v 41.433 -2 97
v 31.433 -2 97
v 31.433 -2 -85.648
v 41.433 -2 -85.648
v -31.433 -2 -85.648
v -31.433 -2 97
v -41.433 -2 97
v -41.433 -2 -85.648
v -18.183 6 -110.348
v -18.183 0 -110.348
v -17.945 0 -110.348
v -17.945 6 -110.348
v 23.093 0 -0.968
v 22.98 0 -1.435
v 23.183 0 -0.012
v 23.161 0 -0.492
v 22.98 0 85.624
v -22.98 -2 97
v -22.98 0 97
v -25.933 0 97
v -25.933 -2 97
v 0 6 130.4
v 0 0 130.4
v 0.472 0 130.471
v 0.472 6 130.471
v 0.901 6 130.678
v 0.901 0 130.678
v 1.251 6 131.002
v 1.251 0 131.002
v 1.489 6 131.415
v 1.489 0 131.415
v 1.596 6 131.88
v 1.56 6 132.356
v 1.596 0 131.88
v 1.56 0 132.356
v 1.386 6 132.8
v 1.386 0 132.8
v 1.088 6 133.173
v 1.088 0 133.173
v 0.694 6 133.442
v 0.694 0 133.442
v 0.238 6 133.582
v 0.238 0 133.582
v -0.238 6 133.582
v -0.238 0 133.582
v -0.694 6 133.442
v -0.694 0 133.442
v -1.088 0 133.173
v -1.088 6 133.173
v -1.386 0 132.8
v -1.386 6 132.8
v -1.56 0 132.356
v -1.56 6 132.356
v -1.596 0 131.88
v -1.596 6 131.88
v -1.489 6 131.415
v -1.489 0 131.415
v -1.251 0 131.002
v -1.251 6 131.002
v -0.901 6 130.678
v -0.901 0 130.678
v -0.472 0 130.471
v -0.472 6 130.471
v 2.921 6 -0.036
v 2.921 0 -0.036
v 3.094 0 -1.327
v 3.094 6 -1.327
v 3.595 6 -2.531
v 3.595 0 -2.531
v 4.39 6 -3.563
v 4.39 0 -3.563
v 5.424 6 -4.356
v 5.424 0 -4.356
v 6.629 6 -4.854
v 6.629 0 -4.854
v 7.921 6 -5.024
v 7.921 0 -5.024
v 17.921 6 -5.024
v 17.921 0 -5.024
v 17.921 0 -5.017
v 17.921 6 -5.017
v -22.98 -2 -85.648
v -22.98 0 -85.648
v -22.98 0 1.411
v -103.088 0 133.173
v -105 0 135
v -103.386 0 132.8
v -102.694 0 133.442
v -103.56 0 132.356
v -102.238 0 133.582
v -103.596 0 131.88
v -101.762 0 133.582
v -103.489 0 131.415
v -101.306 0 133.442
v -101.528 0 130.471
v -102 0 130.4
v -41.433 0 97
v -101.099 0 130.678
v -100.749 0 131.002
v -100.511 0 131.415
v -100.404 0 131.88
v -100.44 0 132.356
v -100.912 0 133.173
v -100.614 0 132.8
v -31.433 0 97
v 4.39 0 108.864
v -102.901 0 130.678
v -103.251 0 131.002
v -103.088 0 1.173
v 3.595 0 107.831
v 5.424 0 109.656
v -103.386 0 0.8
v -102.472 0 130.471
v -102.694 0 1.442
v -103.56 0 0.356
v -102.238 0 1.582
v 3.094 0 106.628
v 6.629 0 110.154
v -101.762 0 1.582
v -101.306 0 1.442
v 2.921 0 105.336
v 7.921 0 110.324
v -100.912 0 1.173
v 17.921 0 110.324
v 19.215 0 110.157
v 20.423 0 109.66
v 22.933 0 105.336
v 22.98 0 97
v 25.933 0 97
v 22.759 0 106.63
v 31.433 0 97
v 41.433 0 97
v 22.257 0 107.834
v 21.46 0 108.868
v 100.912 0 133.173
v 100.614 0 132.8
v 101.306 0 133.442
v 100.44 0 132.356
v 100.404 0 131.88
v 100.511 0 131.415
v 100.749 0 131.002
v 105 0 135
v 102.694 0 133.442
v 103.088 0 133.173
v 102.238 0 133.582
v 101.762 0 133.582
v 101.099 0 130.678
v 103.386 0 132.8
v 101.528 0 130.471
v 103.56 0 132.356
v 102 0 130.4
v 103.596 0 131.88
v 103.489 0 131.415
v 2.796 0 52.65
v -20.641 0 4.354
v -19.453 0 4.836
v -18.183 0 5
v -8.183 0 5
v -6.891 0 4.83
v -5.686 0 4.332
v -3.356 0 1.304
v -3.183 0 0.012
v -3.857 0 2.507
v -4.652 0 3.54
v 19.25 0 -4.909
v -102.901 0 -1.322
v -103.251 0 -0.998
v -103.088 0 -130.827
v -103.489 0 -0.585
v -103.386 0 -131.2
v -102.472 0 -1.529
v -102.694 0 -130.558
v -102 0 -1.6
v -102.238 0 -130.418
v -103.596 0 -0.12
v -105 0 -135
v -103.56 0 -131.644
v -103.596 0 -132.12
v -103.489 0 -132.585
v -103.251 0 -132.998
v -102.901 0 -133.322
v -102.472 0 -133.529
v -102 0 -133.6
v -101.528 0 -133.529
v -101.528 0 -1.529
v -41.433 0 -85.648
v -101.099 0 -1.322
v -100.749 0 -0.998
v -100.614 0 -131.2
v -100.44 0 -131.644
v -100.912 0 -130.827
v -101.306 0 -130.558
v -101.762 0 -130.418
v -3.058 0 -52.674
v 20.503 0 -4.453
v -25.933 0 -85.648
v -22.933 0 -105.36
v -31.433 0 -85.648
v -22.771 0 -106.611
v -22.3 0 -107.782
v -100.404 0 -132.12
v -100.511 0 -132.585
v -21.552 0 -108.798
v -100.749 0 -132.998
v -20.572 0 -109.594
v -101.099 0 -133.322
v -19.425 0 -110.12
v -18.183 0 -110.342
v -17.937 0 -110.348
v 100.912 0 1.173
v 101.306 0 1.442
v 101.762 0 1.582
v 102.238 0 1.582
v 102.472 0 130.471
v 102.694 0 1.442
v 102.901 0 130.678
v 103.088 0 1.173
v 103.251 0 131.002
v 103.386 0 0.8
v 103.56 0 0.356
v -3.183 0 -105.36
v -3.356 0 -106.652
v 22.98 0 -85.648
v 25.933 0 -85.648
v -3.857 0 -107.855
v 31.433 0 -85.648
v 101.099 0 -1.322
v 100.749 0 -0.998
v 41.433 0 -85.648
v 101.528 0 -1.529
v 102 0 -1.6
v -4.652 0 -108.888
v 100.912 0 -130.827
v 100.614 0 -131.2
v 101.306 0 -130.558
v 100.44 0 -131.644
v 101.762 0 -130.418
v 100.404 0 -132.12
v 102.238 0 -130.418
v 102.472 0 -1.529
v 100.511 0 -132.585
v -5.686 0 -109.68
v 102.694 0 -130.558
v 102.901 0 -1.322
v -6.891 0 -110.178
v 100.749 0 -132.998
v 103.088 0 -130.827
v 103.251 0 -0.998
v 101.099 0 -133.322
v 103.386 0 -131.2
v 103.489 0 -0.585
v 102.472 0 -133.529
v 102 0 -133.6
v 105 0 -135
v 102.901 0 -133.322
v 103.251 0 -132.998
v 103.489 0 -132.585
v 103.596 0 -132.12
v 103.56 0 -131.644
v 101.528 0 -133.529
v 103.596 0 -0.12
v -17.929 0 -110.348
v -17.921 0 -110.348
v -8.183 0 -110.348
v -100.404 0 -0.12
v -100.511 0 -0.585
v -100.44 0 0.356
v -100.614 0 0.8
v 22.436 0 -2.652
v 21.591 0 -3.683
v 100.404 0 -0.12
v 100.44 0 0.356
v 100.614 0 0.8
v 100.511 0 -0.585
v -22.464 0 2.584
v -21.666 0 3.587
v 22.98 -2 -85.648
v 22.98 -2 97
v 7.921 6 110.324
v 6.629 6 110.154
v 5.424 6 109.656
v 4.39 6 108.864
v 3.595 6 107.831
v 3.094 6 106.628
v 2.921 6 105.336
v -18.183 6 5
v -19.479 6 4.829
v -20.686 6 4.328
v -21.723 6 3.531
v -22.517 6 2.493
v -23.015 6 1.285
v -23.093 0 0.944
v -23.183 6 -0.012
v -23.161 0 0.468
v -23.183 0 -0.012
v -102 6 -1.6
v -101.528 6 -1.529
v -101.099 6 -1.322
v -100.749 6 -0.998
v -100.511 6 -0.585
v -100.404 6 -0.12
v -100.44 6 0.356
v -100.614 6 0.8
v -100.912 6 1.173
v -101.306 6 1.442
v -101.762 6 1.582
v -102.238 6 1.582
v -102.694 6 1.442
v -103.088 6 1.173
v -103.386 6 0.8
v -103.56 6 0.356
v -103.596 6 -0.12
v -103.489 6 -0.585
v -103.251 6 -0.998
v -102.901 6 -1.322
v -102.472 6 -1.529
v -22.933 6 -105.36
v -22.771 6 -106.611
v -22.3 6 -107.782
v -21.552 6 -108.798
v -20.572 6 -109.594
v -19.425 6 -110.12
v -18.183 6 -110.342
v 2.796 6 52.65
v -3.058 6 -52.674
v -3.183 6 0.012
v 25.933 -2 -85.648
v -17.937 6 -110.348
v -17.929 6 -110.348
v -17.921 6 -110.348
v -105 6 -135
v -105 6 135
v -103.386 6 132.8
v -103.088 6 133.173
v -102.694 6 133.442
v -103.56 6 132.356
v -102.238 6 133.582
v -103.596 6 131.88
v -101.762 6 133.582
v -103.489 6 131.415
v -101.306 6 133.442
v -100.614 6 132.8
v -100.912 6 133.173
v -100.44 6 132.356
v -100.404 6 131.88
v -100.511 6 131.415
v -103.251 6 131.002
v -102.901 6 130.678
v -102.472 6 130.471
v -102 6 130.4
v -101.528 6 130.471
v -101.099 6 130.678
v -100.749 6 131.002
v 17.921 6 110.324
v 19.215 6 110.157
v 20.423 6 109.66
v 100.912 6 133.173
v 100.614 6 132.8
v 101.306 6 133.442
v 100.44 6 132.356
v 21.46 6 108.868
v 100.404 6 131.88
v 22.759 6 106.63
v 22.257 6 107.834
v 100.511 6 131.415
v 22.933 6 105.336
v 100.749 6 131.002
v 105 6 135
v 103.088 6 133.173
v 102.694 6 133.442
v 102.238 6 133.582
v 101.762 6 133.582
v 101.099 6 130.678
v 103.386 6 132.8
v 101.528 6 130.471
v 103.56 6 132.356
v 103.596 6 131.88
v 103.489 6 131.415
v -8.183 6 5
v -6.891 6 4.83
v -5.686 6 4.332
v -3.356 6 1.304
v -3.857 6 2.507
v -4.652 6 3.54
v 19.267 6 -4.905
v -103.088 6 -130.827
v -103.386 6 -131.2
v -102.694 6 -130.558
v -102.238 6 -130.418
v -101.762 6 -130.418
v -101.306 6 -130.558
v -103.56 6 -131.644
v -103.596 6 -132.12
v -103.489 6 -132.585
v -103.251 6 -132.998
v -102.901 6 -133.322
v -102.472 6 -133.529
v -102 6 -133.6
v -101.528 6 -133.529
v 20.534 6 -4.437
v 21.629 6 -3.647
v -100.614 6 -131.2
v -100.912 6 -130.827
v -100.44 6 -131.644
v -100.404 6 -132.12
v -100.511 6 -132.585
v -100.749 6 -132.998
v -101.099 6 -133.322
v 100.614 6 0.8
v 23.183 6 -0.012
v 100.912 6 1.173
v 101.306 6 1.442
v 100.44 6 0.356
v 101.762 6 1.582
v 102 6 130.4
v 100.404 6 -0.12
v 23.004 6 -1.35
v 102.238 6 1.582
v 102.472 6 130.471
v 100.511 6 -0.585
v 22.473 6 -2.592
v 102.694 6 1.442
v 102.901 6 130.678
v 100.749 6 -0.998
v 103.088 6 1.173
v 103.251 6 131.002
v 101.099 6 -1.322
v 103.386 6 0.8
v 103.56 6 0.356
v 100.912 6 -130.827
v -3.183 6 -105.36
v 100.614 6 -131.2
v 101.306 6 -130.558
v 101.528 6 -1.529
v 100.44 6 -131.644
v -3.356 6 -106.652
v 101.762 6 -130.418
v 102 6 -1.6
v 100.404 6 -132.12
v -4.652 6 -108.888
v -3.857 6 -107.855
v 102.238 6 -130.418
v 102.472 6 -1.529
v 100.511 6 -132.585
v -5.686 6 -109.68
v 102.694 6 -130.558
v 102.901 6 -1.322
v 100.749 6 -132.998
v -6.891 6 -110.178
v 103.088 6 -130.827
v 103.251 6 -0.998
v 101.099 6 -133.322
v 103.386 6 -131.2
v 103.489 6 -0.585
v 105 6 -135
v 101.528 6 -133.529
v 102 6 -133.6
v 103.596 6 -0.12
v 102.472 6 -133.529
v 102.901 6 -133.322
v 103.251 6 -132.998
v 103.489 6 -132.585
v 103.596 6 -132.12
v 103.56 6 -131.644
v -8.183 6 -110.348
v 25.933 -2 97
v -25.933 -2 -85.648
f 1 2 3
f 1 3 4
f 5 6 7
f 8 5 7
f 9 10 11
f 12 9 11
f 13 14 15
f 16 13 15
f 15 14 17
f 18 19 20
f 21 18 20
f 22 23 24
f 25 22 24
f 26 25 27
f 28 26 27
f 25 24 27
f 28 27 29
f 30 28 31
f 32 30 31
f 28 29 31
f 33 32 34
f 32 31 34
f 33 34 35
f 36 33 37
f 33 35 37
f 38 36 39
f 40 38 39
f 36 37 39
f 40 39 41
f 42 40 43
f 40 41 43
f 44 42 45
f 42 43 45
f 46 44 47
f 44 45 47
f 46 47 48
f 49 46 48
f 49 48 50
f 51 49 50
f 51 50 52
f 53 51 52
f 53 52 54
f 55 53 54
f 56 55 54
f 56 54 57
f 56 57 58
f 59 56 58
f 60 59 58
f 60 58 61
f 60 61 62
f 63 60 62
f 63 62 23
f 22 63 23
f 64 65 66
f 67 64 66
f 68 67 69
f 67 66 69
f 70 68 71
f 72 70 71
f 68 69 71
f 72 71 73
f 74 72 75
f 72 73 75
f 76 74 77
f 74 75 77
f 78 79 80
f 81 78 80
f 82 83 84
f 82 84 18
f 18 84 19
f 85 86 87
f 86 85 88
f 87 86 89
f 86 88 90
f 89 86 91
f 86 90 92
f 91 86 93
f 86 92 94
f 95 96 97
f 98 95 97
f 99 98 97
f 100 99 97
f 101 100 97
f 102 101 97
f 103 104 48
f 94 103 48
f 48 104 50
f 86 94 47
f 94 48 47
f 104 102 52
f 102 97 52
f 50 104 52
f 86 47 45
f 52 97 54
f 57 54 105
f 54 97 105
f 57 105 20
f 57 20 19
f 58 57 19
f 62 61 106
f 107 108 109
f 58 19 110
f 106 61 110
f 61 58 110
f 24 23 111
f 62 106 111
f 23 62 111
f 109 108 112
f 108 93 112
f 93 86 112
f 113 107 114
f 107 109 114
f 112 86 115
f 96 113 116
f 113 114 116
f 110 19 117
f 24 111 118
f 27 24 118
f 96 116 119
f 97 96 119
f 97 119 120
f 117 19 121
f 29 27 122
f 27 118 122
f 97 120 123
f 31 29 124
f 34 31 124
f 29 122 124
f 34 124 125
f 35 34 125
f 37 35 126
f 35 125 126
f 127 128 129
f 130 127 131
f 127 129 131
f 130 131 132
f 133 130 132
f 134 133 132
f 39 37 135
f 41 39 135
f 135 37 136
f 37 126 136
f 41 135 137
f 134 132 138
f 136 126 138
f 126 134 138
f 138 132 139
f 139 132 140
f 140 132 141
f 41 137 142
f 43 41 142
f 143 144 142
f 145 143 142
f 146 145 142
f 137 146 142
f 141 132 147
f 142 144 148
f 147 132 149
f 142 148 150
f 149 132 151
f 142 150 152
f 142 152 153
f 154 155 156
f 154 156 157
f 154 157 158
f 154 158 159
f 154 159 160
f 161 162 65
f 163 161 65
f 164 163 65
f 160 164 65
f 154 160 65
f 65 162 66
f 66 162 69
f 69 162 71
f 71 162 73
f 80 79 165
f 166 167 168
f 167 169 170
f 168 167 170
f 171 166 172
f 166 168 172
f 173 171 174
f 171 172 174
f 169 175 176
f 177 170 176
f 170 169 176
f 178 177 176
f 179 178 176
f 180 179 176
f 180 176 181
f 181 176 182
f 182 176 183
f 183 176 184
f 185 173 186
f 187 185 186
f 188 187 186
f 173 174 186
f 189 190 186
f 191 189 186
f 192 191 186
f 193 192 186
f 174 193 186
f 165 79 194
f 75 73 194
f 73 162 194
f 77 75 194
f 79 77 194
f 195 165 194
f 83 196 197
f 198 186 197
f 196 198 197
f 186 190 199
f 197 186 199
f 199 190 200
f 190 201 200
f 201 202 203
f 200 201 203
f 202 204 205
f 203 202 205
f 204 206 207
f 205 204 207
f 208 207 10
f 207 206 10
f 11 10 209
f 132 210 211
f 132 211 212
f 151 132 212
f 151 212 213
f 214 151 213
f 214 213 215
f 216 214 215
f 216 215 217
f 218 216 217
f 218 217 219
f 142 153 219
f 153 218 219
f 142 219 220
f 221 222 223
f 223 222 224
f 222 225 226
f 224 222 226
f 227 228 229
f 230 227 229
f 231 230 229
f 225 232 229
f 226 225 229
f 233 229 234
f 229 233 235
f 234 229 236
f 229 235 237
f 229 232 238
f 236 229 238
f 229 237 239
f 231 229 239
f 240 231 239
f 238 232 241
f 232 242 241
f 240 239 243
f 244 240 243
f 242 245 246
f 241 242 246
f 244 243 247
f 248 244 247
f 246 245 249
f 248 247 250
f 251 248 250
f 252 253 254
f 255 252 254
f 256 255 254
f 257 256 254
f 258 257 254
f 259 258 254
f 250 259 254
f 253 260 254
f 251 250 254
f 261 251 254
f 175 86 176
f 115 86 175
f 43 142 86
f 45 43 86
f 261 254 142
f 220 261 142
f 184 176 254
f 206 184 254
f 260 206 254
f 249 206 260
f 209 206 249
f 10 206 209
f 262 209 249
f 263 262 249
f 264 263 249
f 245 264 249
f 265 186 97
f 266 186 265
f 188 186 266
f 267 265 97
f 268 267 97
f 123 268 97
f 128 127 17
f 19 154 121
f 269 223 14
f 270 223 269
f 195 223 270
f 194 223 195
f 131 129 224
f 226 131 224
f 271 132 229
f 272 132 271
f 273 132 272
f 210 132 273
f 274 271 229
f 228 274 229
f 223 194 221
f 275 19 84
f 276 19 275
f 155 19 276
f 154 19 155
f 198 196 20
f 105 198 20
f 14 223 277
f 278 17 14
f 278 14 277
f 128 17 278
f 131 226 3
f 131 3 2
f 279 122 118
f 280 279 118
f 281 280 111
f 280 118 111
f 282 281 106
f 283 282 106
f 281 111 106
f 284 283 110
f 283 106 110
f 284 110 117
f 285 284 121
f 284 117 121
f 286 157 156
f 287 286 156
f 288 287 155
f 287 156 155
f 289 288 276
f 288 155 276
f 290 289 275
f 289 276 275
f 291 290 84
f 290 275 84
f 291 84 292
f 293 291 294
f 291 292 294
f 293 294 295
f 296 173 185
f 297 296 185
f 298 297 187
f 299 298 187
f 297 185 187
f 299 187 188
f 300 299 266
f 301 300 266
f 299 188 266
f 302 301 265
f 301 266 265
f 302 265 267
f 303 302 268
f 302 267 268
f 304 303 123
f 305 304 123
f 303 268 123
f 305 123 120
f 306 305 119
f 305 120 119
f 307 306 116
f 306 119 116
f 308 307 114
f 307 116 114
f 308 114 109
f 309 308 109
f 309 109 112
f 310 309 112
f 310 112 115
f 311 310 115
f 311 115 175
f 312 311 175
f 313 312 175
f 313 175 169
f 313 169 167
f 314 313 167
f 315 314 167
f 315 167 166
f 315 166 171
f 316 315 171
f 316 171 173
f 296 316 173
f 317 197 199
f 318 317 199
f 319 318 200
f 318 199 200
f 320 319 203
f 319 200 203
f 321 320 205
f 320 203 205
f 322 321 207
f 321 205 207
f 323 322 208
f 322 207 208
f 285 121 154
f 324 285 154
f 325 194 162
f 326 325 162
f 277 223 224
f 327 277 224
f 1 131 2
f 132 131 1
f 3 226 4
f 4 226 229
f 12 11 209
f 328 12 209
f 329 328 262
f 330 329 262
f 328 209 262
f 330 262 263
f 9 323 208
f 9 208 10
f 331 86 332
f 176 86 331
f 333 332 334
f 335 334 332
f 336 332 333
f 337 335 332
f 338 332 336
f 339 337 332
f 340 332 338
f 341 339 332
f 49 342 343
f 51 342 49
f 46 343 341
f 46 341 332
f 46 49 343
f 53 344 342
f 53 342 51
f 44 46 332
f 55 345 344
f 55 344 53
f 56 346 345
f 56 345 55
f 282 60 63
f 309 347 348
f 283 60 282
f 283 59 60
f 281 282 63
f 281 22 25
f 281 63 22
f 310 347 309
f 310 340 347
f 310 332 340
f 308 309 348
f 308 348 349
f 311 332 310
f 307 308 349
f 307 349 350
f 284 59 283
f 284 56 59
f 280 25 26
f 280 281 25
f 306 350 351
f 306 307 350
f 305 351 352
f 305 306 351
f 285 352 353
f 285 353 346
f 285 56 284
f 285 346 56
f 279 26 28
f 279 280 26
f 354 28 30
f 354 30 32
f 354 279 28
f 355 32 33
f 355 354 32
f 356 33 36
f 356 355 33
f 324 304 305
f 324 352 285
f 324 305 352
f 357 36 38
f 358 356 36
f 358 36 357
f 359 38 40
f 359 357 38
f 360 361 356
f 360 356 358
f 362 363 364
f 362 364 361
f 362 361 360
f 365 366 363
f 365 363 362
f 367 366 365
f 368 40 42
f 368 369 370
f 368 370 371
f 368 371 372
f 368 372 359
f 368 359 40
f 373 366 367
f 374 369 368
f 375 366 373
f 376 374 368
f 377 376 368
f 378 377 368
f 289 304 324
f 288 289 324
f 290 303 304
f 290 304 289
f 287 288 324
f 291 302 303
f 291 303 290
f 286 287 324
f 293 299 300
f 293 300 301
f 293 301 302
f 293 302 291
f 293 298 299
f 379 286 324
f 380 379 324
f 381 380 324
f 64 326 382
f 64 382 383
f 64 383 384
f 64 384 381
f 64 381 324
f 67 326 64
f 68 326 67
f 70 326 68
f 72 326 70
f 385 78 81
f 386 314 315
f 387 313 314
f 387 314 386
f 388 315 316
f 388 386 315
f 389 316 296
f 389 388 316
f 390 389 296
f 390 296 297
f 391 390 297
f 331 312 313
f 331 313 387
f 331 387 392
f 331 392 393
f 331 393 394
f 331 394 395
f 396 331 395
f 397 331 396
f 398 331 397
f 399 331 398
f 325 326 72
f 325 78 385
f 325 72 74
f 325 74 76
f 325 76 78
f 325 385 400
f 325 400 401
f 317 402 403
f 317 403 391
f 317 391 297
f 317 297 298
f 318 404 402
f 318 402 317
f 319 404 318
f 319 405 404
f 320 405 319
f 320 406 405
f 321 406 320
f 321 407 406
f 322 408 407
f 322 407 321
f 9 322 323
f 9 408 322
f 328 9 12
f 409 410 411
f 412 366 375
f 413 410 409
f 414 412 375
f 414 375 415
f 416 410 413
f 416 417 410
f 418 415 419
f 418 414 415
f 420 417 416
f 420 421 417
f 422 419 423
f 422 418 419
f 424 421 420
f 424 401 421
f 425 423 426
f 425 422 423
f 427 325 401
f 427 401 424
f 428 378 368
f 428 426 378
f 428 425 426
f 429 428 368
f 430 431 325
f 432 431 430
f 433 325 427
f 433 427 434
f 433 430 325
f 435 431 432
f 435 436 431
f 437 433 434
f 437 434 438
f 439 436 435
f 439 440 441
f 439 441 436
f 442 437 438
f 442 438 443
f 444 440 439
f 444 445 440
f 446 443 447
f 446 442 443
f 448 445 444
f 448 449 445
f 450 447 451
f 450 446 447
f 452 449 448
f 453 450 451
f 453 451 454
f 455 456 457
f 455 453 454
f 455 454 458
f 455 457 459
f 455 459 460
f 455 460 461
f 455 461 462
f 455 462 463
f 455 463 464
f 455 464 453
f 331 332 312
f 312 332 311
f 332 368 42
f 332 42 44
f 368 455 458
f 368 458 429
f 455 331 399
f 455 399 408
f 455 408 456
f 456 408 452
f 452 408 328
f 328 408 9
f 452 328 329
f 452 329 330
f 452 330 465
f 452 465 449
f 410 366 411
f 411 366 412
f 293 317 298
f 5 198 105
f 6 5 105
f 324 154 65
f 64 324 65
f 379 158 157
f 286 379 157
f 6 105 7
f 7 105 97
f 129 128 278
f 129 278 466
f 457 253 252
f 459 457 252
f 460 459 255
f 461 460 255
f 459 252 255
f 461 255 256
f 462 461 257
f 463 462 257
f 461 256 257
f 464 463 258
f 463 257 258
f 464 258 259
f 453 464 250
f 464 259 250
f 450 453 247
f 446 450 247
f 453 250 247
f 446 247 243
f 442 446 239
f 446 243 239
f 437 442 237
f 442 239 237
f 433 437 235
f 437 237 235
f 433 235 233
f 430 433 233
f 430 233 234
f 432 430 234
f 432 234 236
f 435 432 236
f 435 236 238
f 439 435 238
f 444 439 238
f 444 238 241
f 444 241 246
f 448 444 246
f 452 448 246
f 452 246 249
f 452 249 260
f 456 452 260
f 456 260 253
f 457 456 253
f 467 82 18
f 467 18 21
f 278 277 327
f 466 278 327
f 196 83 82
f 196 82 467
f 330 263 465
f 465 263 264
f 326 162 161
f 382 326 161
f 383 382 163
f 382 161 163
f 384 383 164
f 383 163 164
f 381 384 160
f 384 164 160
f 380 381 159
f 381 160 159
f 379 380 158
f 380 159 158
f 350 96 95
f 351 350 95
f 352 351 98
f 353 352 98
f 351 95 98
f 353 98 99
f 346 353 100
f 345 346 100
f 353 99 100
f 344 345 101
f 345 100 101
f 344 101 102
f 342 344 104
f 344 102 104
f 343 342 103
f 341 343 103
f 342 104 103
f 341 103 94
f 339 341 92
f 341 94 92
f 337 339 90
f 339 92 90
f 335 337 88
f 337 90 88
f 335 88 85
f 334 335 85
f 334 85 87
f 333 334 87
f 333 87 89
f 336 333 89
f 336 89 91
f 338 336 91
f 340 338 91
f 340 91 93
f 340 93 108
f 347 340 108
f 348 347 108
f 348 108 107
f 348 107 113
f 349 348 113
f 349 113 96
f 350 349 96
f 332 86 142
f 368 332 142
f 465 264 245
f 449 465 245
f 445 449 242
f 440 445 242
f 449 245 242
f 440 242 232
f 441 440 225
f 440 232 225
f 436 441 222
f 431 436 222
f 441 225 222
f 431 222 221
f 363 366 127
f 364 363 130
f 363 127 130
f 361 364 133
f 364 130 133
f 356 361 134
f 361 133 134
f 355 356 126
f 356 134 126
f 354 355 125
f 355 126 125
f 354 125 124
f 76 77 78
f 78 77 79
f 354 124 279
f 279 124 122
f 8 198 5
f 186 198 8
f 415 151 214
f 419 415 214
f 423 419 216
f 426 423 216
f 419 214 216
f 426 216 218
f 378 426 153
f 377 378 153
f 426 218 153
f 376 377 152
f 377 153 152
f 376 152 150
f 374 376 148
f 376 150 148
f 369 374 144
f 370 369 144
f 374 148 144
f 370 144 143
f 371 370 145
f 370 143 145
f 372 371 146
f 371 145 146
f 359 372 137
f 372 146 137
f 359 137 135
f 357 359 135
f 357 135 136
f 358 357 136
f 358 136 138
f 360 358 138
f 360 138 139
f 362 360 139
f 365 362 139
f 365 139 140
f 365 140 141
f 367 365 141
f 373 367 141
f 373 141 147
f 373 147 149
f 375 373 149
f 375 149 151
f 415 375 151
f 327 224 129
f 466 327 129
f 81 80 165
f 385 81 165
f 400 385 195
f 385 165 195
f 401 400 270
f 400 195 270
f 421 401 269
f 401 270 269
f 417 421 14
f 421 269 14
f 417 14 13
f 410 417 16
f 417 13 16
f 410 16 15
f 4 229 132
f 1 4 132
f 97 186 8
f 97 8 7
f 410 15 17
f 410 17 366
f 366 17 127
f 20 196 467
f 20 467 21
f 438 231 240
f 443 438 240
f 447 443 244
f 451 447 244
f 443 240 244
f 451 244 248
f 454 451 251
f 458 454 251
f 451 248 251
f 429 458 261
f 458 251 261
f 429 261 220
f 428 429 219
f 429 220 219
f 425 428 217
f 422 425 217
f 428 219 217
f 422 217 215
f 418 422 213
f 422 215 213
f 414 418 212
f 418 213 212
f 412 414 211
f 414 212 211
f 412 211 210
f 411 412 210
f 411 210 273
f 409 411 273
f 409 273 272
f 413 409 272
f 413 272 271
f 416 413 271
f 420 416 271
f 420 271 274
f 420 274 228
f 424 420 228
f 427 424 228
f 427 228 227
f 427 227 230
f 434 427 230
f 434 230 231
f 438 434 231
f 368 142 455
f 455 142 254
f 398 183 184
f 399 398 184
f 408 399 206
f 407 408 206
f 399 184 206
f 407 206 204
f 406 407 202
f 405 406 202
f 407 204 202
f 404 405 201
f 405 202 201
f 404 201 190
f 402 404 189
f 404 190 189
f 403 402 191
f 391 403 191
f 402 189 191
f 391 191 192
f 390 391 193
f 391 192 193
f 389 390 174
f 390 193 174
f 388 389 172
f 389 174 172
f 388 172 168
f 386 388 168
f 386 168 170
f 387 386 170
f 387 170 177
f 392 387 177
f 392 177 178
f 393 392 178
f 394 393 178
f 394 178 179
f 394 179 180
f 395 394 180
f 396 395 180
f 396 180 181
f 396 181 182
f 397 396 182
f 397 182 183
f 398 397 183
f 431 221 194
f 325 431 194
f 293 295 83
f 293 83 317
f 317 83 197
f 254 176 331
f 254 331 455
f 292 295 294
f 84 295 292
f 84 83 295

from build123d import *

# Parameters (mm, degrees)
SKETCH1_W           = 210
SKETCH1_H           = 270
BOSS_EXTRUDE1_DEPTH = 6
BOSS_EXTRUDE2_START = -6
SKETCH2_W           = 10
SKETCH2_H           = 182.647861203
SKETCH2_W_2         = 2.953235851
BOSS_EXTRUDE2_DEPTH = 2
SKETCH3_R           = 1.6
CUT_EXTRUDE1_DEPTH  = 30
CUT_EXTRUDE2_DEPTH  = 10
CUT_EXTRUDE3_DEPTH  = 10


with BuildPart() as part:
    # Sketch1 → Boss-Extrude1 (new body)
    with BuildSketch(Plane(origin=(0, 0, 0), x_dir=(1, 0, 0), z_dir=(0, 1, 0))):
        Rectangle(SKETCH1_W, SKETCH1_H)
        with BuildLine():
            Line((-12.932865781, 105.336093738), (-13.182865781, -0.011865408))
            ThreePointArc((-13.182865781, -0.011865408), (-18.19471711, -4.999985921), (-23.182837623, 0.011865408))
            Line((-23.182837623, 0.011865408), (-22.932837623, 105.359824553))
            ThreePointArc((-22.932837623, 105.359824553), (-17.920986294, 110.347945067), (-12.932865781, 105.336093738))
        make_face(mode=Mode.SUBTRACT)
        with BuildLine():
            Line((12.932865781, -105.312362923), (13.182865781, 0.035596223))
            ThreePointArc((13.182865781, 0.035596223), (18.19471711, 5.023716736), (23.182837623, 0.011865408))
            Line((23.182837623, 0.011865408), (22.932837623, -105.336093738))
            ThreePointArc((22.932837623, -105.336093738), (17.920986294, -110.324214252), (12.932865781, -105.312362923))
        make_face(mode=Mode.SUBTRACT)
    extrude(amount=BOSS_EXTRUDE1_DEPTH)

    # Sketch2 → Boss-Extrude2 (add)
    with BuildSketch(Plane(origin=(0, 6, 0), x_dir=(-1, 0, 0), z_dir=(0, 1, 0)).offset(BOSS_EXTRUDE2_START)):
        with Locations((36.432851702, 5.676069398)):
            Rectangle(SKETCH2_W, SKETCH2_H)
        with Locations((24.456233776, 5.676069398)):
            Rectangle(SKETCH2_W_2, SKETCH2_H)
    boss_extrude2 = extrude(amount=-BOSS_EXTRUDE2_DEPTH)

    # Mirror1: Boss-Extrude2 across plane
    add(boss_extrude2.mirror(Plane(origin=(0, 0, 0), x_dir=(0, 0, 1), z_dir=(1, 0, 0))))

    # Sketch3 → Cut-Extrude1 (cut)
    with BuildSketch(Plane.XZ):
        with Locations(Location((-102, 132, 0), (0, 0, 270))):
            Circle(SKETCH3_R)
        with Locations(Location((0, 132, 0), (0, 0, 270))):
            Circle(SKETCH3_R)
        with Locations(Location((102, 132, 0), (0, 0, 270))):
            Circle(SKETCH3_R)
        with Locations(Location((-102, 0, 0), (0, 0, 270))):
            Circle(SKETCH3_R)
        with Locations(Location((-102, -132, 0), (0, 0, 270))):
            Circle(SKETCH3_R)
        with Locations(Location((102, -132, 0), (0, 0, 270))):
            Circle(SKETCH3_R)
        with Locations(Location((102, 0, 0), (0, 0, 270))):
            Circle(SKETCH3_R)
    extrude(amount=-CUT_EXTRUDE1_DEPTH, mode=Mode.SUBTRACT)

    # Sketch4 → Cut-Extrude2 (cut)
    with BuildSketch(Plane.XZ):
        with BuildLine():
            Line((-8.182851702, 5), (-18.182851702, 5))
            Line((-18.182851702, 5), (-18.051918998, -52.673972533))
            Line((-18.051918998, -52.673972533), (-18.182851702, -110.347945067))
            Line((-18.182851702, -110.347945067), (-8.182851702, -110.347945067))
            ThreePointArc((-8.182851702, -110.347945067), (-4.651515343, -108.887671542), (-3.182865781, -105.359810475))
            Line((-3.182865781, -105.359810475), (-3.05783764, -52.673972533))
            Line((-3.05783764, -52.673972533), (-3.182865781, 0.011865408))
            ThreePointArc((-3.182865781, 0.011865408), (-4.651515343, 3.539726475), (-8.182851702, 5))
        make_face()
    extrude(amount=-CUT_EXTRUDE2_DEPTH, mode=Mode.SUBTRACT)

    # Sketch5 → Cut-Extrude3 (cut)
    with BuildSketch(Plane.XZ):
        with BuildLine():
            Line((7.920986294, -5.023730815), (17.920986294, -5.023730815))
            Line((17.920986294, -5.023730815), (17.790053591, 52.650241718))
            Line((17.790053591, 52.650241718), (17.920986294, 110.324214252))
            Line((17.920986294, 110.324214252), (7.920986294, 110.324214252))
            ThreePointArc((7.920986294, 110.324214252), (4.389649935, 108.863940727), (2.921000373, 105.336079659))
            Line((2.921000373, 105.336079659), (2.795972232, 52.650241718))
            Line((2.795972232, 52.650241718), (2.921000373, -0.035596223))
            ThreePointArc((2.921000373, -0.035596223), (4.389649935, -3.56345729), (7.920986294, -5.023730815))
        make_face()
    extrude(amount=-CUT_EXTRUDE3_DEPTH, mode=Mode.SUBTRACT)


solid = part.part
